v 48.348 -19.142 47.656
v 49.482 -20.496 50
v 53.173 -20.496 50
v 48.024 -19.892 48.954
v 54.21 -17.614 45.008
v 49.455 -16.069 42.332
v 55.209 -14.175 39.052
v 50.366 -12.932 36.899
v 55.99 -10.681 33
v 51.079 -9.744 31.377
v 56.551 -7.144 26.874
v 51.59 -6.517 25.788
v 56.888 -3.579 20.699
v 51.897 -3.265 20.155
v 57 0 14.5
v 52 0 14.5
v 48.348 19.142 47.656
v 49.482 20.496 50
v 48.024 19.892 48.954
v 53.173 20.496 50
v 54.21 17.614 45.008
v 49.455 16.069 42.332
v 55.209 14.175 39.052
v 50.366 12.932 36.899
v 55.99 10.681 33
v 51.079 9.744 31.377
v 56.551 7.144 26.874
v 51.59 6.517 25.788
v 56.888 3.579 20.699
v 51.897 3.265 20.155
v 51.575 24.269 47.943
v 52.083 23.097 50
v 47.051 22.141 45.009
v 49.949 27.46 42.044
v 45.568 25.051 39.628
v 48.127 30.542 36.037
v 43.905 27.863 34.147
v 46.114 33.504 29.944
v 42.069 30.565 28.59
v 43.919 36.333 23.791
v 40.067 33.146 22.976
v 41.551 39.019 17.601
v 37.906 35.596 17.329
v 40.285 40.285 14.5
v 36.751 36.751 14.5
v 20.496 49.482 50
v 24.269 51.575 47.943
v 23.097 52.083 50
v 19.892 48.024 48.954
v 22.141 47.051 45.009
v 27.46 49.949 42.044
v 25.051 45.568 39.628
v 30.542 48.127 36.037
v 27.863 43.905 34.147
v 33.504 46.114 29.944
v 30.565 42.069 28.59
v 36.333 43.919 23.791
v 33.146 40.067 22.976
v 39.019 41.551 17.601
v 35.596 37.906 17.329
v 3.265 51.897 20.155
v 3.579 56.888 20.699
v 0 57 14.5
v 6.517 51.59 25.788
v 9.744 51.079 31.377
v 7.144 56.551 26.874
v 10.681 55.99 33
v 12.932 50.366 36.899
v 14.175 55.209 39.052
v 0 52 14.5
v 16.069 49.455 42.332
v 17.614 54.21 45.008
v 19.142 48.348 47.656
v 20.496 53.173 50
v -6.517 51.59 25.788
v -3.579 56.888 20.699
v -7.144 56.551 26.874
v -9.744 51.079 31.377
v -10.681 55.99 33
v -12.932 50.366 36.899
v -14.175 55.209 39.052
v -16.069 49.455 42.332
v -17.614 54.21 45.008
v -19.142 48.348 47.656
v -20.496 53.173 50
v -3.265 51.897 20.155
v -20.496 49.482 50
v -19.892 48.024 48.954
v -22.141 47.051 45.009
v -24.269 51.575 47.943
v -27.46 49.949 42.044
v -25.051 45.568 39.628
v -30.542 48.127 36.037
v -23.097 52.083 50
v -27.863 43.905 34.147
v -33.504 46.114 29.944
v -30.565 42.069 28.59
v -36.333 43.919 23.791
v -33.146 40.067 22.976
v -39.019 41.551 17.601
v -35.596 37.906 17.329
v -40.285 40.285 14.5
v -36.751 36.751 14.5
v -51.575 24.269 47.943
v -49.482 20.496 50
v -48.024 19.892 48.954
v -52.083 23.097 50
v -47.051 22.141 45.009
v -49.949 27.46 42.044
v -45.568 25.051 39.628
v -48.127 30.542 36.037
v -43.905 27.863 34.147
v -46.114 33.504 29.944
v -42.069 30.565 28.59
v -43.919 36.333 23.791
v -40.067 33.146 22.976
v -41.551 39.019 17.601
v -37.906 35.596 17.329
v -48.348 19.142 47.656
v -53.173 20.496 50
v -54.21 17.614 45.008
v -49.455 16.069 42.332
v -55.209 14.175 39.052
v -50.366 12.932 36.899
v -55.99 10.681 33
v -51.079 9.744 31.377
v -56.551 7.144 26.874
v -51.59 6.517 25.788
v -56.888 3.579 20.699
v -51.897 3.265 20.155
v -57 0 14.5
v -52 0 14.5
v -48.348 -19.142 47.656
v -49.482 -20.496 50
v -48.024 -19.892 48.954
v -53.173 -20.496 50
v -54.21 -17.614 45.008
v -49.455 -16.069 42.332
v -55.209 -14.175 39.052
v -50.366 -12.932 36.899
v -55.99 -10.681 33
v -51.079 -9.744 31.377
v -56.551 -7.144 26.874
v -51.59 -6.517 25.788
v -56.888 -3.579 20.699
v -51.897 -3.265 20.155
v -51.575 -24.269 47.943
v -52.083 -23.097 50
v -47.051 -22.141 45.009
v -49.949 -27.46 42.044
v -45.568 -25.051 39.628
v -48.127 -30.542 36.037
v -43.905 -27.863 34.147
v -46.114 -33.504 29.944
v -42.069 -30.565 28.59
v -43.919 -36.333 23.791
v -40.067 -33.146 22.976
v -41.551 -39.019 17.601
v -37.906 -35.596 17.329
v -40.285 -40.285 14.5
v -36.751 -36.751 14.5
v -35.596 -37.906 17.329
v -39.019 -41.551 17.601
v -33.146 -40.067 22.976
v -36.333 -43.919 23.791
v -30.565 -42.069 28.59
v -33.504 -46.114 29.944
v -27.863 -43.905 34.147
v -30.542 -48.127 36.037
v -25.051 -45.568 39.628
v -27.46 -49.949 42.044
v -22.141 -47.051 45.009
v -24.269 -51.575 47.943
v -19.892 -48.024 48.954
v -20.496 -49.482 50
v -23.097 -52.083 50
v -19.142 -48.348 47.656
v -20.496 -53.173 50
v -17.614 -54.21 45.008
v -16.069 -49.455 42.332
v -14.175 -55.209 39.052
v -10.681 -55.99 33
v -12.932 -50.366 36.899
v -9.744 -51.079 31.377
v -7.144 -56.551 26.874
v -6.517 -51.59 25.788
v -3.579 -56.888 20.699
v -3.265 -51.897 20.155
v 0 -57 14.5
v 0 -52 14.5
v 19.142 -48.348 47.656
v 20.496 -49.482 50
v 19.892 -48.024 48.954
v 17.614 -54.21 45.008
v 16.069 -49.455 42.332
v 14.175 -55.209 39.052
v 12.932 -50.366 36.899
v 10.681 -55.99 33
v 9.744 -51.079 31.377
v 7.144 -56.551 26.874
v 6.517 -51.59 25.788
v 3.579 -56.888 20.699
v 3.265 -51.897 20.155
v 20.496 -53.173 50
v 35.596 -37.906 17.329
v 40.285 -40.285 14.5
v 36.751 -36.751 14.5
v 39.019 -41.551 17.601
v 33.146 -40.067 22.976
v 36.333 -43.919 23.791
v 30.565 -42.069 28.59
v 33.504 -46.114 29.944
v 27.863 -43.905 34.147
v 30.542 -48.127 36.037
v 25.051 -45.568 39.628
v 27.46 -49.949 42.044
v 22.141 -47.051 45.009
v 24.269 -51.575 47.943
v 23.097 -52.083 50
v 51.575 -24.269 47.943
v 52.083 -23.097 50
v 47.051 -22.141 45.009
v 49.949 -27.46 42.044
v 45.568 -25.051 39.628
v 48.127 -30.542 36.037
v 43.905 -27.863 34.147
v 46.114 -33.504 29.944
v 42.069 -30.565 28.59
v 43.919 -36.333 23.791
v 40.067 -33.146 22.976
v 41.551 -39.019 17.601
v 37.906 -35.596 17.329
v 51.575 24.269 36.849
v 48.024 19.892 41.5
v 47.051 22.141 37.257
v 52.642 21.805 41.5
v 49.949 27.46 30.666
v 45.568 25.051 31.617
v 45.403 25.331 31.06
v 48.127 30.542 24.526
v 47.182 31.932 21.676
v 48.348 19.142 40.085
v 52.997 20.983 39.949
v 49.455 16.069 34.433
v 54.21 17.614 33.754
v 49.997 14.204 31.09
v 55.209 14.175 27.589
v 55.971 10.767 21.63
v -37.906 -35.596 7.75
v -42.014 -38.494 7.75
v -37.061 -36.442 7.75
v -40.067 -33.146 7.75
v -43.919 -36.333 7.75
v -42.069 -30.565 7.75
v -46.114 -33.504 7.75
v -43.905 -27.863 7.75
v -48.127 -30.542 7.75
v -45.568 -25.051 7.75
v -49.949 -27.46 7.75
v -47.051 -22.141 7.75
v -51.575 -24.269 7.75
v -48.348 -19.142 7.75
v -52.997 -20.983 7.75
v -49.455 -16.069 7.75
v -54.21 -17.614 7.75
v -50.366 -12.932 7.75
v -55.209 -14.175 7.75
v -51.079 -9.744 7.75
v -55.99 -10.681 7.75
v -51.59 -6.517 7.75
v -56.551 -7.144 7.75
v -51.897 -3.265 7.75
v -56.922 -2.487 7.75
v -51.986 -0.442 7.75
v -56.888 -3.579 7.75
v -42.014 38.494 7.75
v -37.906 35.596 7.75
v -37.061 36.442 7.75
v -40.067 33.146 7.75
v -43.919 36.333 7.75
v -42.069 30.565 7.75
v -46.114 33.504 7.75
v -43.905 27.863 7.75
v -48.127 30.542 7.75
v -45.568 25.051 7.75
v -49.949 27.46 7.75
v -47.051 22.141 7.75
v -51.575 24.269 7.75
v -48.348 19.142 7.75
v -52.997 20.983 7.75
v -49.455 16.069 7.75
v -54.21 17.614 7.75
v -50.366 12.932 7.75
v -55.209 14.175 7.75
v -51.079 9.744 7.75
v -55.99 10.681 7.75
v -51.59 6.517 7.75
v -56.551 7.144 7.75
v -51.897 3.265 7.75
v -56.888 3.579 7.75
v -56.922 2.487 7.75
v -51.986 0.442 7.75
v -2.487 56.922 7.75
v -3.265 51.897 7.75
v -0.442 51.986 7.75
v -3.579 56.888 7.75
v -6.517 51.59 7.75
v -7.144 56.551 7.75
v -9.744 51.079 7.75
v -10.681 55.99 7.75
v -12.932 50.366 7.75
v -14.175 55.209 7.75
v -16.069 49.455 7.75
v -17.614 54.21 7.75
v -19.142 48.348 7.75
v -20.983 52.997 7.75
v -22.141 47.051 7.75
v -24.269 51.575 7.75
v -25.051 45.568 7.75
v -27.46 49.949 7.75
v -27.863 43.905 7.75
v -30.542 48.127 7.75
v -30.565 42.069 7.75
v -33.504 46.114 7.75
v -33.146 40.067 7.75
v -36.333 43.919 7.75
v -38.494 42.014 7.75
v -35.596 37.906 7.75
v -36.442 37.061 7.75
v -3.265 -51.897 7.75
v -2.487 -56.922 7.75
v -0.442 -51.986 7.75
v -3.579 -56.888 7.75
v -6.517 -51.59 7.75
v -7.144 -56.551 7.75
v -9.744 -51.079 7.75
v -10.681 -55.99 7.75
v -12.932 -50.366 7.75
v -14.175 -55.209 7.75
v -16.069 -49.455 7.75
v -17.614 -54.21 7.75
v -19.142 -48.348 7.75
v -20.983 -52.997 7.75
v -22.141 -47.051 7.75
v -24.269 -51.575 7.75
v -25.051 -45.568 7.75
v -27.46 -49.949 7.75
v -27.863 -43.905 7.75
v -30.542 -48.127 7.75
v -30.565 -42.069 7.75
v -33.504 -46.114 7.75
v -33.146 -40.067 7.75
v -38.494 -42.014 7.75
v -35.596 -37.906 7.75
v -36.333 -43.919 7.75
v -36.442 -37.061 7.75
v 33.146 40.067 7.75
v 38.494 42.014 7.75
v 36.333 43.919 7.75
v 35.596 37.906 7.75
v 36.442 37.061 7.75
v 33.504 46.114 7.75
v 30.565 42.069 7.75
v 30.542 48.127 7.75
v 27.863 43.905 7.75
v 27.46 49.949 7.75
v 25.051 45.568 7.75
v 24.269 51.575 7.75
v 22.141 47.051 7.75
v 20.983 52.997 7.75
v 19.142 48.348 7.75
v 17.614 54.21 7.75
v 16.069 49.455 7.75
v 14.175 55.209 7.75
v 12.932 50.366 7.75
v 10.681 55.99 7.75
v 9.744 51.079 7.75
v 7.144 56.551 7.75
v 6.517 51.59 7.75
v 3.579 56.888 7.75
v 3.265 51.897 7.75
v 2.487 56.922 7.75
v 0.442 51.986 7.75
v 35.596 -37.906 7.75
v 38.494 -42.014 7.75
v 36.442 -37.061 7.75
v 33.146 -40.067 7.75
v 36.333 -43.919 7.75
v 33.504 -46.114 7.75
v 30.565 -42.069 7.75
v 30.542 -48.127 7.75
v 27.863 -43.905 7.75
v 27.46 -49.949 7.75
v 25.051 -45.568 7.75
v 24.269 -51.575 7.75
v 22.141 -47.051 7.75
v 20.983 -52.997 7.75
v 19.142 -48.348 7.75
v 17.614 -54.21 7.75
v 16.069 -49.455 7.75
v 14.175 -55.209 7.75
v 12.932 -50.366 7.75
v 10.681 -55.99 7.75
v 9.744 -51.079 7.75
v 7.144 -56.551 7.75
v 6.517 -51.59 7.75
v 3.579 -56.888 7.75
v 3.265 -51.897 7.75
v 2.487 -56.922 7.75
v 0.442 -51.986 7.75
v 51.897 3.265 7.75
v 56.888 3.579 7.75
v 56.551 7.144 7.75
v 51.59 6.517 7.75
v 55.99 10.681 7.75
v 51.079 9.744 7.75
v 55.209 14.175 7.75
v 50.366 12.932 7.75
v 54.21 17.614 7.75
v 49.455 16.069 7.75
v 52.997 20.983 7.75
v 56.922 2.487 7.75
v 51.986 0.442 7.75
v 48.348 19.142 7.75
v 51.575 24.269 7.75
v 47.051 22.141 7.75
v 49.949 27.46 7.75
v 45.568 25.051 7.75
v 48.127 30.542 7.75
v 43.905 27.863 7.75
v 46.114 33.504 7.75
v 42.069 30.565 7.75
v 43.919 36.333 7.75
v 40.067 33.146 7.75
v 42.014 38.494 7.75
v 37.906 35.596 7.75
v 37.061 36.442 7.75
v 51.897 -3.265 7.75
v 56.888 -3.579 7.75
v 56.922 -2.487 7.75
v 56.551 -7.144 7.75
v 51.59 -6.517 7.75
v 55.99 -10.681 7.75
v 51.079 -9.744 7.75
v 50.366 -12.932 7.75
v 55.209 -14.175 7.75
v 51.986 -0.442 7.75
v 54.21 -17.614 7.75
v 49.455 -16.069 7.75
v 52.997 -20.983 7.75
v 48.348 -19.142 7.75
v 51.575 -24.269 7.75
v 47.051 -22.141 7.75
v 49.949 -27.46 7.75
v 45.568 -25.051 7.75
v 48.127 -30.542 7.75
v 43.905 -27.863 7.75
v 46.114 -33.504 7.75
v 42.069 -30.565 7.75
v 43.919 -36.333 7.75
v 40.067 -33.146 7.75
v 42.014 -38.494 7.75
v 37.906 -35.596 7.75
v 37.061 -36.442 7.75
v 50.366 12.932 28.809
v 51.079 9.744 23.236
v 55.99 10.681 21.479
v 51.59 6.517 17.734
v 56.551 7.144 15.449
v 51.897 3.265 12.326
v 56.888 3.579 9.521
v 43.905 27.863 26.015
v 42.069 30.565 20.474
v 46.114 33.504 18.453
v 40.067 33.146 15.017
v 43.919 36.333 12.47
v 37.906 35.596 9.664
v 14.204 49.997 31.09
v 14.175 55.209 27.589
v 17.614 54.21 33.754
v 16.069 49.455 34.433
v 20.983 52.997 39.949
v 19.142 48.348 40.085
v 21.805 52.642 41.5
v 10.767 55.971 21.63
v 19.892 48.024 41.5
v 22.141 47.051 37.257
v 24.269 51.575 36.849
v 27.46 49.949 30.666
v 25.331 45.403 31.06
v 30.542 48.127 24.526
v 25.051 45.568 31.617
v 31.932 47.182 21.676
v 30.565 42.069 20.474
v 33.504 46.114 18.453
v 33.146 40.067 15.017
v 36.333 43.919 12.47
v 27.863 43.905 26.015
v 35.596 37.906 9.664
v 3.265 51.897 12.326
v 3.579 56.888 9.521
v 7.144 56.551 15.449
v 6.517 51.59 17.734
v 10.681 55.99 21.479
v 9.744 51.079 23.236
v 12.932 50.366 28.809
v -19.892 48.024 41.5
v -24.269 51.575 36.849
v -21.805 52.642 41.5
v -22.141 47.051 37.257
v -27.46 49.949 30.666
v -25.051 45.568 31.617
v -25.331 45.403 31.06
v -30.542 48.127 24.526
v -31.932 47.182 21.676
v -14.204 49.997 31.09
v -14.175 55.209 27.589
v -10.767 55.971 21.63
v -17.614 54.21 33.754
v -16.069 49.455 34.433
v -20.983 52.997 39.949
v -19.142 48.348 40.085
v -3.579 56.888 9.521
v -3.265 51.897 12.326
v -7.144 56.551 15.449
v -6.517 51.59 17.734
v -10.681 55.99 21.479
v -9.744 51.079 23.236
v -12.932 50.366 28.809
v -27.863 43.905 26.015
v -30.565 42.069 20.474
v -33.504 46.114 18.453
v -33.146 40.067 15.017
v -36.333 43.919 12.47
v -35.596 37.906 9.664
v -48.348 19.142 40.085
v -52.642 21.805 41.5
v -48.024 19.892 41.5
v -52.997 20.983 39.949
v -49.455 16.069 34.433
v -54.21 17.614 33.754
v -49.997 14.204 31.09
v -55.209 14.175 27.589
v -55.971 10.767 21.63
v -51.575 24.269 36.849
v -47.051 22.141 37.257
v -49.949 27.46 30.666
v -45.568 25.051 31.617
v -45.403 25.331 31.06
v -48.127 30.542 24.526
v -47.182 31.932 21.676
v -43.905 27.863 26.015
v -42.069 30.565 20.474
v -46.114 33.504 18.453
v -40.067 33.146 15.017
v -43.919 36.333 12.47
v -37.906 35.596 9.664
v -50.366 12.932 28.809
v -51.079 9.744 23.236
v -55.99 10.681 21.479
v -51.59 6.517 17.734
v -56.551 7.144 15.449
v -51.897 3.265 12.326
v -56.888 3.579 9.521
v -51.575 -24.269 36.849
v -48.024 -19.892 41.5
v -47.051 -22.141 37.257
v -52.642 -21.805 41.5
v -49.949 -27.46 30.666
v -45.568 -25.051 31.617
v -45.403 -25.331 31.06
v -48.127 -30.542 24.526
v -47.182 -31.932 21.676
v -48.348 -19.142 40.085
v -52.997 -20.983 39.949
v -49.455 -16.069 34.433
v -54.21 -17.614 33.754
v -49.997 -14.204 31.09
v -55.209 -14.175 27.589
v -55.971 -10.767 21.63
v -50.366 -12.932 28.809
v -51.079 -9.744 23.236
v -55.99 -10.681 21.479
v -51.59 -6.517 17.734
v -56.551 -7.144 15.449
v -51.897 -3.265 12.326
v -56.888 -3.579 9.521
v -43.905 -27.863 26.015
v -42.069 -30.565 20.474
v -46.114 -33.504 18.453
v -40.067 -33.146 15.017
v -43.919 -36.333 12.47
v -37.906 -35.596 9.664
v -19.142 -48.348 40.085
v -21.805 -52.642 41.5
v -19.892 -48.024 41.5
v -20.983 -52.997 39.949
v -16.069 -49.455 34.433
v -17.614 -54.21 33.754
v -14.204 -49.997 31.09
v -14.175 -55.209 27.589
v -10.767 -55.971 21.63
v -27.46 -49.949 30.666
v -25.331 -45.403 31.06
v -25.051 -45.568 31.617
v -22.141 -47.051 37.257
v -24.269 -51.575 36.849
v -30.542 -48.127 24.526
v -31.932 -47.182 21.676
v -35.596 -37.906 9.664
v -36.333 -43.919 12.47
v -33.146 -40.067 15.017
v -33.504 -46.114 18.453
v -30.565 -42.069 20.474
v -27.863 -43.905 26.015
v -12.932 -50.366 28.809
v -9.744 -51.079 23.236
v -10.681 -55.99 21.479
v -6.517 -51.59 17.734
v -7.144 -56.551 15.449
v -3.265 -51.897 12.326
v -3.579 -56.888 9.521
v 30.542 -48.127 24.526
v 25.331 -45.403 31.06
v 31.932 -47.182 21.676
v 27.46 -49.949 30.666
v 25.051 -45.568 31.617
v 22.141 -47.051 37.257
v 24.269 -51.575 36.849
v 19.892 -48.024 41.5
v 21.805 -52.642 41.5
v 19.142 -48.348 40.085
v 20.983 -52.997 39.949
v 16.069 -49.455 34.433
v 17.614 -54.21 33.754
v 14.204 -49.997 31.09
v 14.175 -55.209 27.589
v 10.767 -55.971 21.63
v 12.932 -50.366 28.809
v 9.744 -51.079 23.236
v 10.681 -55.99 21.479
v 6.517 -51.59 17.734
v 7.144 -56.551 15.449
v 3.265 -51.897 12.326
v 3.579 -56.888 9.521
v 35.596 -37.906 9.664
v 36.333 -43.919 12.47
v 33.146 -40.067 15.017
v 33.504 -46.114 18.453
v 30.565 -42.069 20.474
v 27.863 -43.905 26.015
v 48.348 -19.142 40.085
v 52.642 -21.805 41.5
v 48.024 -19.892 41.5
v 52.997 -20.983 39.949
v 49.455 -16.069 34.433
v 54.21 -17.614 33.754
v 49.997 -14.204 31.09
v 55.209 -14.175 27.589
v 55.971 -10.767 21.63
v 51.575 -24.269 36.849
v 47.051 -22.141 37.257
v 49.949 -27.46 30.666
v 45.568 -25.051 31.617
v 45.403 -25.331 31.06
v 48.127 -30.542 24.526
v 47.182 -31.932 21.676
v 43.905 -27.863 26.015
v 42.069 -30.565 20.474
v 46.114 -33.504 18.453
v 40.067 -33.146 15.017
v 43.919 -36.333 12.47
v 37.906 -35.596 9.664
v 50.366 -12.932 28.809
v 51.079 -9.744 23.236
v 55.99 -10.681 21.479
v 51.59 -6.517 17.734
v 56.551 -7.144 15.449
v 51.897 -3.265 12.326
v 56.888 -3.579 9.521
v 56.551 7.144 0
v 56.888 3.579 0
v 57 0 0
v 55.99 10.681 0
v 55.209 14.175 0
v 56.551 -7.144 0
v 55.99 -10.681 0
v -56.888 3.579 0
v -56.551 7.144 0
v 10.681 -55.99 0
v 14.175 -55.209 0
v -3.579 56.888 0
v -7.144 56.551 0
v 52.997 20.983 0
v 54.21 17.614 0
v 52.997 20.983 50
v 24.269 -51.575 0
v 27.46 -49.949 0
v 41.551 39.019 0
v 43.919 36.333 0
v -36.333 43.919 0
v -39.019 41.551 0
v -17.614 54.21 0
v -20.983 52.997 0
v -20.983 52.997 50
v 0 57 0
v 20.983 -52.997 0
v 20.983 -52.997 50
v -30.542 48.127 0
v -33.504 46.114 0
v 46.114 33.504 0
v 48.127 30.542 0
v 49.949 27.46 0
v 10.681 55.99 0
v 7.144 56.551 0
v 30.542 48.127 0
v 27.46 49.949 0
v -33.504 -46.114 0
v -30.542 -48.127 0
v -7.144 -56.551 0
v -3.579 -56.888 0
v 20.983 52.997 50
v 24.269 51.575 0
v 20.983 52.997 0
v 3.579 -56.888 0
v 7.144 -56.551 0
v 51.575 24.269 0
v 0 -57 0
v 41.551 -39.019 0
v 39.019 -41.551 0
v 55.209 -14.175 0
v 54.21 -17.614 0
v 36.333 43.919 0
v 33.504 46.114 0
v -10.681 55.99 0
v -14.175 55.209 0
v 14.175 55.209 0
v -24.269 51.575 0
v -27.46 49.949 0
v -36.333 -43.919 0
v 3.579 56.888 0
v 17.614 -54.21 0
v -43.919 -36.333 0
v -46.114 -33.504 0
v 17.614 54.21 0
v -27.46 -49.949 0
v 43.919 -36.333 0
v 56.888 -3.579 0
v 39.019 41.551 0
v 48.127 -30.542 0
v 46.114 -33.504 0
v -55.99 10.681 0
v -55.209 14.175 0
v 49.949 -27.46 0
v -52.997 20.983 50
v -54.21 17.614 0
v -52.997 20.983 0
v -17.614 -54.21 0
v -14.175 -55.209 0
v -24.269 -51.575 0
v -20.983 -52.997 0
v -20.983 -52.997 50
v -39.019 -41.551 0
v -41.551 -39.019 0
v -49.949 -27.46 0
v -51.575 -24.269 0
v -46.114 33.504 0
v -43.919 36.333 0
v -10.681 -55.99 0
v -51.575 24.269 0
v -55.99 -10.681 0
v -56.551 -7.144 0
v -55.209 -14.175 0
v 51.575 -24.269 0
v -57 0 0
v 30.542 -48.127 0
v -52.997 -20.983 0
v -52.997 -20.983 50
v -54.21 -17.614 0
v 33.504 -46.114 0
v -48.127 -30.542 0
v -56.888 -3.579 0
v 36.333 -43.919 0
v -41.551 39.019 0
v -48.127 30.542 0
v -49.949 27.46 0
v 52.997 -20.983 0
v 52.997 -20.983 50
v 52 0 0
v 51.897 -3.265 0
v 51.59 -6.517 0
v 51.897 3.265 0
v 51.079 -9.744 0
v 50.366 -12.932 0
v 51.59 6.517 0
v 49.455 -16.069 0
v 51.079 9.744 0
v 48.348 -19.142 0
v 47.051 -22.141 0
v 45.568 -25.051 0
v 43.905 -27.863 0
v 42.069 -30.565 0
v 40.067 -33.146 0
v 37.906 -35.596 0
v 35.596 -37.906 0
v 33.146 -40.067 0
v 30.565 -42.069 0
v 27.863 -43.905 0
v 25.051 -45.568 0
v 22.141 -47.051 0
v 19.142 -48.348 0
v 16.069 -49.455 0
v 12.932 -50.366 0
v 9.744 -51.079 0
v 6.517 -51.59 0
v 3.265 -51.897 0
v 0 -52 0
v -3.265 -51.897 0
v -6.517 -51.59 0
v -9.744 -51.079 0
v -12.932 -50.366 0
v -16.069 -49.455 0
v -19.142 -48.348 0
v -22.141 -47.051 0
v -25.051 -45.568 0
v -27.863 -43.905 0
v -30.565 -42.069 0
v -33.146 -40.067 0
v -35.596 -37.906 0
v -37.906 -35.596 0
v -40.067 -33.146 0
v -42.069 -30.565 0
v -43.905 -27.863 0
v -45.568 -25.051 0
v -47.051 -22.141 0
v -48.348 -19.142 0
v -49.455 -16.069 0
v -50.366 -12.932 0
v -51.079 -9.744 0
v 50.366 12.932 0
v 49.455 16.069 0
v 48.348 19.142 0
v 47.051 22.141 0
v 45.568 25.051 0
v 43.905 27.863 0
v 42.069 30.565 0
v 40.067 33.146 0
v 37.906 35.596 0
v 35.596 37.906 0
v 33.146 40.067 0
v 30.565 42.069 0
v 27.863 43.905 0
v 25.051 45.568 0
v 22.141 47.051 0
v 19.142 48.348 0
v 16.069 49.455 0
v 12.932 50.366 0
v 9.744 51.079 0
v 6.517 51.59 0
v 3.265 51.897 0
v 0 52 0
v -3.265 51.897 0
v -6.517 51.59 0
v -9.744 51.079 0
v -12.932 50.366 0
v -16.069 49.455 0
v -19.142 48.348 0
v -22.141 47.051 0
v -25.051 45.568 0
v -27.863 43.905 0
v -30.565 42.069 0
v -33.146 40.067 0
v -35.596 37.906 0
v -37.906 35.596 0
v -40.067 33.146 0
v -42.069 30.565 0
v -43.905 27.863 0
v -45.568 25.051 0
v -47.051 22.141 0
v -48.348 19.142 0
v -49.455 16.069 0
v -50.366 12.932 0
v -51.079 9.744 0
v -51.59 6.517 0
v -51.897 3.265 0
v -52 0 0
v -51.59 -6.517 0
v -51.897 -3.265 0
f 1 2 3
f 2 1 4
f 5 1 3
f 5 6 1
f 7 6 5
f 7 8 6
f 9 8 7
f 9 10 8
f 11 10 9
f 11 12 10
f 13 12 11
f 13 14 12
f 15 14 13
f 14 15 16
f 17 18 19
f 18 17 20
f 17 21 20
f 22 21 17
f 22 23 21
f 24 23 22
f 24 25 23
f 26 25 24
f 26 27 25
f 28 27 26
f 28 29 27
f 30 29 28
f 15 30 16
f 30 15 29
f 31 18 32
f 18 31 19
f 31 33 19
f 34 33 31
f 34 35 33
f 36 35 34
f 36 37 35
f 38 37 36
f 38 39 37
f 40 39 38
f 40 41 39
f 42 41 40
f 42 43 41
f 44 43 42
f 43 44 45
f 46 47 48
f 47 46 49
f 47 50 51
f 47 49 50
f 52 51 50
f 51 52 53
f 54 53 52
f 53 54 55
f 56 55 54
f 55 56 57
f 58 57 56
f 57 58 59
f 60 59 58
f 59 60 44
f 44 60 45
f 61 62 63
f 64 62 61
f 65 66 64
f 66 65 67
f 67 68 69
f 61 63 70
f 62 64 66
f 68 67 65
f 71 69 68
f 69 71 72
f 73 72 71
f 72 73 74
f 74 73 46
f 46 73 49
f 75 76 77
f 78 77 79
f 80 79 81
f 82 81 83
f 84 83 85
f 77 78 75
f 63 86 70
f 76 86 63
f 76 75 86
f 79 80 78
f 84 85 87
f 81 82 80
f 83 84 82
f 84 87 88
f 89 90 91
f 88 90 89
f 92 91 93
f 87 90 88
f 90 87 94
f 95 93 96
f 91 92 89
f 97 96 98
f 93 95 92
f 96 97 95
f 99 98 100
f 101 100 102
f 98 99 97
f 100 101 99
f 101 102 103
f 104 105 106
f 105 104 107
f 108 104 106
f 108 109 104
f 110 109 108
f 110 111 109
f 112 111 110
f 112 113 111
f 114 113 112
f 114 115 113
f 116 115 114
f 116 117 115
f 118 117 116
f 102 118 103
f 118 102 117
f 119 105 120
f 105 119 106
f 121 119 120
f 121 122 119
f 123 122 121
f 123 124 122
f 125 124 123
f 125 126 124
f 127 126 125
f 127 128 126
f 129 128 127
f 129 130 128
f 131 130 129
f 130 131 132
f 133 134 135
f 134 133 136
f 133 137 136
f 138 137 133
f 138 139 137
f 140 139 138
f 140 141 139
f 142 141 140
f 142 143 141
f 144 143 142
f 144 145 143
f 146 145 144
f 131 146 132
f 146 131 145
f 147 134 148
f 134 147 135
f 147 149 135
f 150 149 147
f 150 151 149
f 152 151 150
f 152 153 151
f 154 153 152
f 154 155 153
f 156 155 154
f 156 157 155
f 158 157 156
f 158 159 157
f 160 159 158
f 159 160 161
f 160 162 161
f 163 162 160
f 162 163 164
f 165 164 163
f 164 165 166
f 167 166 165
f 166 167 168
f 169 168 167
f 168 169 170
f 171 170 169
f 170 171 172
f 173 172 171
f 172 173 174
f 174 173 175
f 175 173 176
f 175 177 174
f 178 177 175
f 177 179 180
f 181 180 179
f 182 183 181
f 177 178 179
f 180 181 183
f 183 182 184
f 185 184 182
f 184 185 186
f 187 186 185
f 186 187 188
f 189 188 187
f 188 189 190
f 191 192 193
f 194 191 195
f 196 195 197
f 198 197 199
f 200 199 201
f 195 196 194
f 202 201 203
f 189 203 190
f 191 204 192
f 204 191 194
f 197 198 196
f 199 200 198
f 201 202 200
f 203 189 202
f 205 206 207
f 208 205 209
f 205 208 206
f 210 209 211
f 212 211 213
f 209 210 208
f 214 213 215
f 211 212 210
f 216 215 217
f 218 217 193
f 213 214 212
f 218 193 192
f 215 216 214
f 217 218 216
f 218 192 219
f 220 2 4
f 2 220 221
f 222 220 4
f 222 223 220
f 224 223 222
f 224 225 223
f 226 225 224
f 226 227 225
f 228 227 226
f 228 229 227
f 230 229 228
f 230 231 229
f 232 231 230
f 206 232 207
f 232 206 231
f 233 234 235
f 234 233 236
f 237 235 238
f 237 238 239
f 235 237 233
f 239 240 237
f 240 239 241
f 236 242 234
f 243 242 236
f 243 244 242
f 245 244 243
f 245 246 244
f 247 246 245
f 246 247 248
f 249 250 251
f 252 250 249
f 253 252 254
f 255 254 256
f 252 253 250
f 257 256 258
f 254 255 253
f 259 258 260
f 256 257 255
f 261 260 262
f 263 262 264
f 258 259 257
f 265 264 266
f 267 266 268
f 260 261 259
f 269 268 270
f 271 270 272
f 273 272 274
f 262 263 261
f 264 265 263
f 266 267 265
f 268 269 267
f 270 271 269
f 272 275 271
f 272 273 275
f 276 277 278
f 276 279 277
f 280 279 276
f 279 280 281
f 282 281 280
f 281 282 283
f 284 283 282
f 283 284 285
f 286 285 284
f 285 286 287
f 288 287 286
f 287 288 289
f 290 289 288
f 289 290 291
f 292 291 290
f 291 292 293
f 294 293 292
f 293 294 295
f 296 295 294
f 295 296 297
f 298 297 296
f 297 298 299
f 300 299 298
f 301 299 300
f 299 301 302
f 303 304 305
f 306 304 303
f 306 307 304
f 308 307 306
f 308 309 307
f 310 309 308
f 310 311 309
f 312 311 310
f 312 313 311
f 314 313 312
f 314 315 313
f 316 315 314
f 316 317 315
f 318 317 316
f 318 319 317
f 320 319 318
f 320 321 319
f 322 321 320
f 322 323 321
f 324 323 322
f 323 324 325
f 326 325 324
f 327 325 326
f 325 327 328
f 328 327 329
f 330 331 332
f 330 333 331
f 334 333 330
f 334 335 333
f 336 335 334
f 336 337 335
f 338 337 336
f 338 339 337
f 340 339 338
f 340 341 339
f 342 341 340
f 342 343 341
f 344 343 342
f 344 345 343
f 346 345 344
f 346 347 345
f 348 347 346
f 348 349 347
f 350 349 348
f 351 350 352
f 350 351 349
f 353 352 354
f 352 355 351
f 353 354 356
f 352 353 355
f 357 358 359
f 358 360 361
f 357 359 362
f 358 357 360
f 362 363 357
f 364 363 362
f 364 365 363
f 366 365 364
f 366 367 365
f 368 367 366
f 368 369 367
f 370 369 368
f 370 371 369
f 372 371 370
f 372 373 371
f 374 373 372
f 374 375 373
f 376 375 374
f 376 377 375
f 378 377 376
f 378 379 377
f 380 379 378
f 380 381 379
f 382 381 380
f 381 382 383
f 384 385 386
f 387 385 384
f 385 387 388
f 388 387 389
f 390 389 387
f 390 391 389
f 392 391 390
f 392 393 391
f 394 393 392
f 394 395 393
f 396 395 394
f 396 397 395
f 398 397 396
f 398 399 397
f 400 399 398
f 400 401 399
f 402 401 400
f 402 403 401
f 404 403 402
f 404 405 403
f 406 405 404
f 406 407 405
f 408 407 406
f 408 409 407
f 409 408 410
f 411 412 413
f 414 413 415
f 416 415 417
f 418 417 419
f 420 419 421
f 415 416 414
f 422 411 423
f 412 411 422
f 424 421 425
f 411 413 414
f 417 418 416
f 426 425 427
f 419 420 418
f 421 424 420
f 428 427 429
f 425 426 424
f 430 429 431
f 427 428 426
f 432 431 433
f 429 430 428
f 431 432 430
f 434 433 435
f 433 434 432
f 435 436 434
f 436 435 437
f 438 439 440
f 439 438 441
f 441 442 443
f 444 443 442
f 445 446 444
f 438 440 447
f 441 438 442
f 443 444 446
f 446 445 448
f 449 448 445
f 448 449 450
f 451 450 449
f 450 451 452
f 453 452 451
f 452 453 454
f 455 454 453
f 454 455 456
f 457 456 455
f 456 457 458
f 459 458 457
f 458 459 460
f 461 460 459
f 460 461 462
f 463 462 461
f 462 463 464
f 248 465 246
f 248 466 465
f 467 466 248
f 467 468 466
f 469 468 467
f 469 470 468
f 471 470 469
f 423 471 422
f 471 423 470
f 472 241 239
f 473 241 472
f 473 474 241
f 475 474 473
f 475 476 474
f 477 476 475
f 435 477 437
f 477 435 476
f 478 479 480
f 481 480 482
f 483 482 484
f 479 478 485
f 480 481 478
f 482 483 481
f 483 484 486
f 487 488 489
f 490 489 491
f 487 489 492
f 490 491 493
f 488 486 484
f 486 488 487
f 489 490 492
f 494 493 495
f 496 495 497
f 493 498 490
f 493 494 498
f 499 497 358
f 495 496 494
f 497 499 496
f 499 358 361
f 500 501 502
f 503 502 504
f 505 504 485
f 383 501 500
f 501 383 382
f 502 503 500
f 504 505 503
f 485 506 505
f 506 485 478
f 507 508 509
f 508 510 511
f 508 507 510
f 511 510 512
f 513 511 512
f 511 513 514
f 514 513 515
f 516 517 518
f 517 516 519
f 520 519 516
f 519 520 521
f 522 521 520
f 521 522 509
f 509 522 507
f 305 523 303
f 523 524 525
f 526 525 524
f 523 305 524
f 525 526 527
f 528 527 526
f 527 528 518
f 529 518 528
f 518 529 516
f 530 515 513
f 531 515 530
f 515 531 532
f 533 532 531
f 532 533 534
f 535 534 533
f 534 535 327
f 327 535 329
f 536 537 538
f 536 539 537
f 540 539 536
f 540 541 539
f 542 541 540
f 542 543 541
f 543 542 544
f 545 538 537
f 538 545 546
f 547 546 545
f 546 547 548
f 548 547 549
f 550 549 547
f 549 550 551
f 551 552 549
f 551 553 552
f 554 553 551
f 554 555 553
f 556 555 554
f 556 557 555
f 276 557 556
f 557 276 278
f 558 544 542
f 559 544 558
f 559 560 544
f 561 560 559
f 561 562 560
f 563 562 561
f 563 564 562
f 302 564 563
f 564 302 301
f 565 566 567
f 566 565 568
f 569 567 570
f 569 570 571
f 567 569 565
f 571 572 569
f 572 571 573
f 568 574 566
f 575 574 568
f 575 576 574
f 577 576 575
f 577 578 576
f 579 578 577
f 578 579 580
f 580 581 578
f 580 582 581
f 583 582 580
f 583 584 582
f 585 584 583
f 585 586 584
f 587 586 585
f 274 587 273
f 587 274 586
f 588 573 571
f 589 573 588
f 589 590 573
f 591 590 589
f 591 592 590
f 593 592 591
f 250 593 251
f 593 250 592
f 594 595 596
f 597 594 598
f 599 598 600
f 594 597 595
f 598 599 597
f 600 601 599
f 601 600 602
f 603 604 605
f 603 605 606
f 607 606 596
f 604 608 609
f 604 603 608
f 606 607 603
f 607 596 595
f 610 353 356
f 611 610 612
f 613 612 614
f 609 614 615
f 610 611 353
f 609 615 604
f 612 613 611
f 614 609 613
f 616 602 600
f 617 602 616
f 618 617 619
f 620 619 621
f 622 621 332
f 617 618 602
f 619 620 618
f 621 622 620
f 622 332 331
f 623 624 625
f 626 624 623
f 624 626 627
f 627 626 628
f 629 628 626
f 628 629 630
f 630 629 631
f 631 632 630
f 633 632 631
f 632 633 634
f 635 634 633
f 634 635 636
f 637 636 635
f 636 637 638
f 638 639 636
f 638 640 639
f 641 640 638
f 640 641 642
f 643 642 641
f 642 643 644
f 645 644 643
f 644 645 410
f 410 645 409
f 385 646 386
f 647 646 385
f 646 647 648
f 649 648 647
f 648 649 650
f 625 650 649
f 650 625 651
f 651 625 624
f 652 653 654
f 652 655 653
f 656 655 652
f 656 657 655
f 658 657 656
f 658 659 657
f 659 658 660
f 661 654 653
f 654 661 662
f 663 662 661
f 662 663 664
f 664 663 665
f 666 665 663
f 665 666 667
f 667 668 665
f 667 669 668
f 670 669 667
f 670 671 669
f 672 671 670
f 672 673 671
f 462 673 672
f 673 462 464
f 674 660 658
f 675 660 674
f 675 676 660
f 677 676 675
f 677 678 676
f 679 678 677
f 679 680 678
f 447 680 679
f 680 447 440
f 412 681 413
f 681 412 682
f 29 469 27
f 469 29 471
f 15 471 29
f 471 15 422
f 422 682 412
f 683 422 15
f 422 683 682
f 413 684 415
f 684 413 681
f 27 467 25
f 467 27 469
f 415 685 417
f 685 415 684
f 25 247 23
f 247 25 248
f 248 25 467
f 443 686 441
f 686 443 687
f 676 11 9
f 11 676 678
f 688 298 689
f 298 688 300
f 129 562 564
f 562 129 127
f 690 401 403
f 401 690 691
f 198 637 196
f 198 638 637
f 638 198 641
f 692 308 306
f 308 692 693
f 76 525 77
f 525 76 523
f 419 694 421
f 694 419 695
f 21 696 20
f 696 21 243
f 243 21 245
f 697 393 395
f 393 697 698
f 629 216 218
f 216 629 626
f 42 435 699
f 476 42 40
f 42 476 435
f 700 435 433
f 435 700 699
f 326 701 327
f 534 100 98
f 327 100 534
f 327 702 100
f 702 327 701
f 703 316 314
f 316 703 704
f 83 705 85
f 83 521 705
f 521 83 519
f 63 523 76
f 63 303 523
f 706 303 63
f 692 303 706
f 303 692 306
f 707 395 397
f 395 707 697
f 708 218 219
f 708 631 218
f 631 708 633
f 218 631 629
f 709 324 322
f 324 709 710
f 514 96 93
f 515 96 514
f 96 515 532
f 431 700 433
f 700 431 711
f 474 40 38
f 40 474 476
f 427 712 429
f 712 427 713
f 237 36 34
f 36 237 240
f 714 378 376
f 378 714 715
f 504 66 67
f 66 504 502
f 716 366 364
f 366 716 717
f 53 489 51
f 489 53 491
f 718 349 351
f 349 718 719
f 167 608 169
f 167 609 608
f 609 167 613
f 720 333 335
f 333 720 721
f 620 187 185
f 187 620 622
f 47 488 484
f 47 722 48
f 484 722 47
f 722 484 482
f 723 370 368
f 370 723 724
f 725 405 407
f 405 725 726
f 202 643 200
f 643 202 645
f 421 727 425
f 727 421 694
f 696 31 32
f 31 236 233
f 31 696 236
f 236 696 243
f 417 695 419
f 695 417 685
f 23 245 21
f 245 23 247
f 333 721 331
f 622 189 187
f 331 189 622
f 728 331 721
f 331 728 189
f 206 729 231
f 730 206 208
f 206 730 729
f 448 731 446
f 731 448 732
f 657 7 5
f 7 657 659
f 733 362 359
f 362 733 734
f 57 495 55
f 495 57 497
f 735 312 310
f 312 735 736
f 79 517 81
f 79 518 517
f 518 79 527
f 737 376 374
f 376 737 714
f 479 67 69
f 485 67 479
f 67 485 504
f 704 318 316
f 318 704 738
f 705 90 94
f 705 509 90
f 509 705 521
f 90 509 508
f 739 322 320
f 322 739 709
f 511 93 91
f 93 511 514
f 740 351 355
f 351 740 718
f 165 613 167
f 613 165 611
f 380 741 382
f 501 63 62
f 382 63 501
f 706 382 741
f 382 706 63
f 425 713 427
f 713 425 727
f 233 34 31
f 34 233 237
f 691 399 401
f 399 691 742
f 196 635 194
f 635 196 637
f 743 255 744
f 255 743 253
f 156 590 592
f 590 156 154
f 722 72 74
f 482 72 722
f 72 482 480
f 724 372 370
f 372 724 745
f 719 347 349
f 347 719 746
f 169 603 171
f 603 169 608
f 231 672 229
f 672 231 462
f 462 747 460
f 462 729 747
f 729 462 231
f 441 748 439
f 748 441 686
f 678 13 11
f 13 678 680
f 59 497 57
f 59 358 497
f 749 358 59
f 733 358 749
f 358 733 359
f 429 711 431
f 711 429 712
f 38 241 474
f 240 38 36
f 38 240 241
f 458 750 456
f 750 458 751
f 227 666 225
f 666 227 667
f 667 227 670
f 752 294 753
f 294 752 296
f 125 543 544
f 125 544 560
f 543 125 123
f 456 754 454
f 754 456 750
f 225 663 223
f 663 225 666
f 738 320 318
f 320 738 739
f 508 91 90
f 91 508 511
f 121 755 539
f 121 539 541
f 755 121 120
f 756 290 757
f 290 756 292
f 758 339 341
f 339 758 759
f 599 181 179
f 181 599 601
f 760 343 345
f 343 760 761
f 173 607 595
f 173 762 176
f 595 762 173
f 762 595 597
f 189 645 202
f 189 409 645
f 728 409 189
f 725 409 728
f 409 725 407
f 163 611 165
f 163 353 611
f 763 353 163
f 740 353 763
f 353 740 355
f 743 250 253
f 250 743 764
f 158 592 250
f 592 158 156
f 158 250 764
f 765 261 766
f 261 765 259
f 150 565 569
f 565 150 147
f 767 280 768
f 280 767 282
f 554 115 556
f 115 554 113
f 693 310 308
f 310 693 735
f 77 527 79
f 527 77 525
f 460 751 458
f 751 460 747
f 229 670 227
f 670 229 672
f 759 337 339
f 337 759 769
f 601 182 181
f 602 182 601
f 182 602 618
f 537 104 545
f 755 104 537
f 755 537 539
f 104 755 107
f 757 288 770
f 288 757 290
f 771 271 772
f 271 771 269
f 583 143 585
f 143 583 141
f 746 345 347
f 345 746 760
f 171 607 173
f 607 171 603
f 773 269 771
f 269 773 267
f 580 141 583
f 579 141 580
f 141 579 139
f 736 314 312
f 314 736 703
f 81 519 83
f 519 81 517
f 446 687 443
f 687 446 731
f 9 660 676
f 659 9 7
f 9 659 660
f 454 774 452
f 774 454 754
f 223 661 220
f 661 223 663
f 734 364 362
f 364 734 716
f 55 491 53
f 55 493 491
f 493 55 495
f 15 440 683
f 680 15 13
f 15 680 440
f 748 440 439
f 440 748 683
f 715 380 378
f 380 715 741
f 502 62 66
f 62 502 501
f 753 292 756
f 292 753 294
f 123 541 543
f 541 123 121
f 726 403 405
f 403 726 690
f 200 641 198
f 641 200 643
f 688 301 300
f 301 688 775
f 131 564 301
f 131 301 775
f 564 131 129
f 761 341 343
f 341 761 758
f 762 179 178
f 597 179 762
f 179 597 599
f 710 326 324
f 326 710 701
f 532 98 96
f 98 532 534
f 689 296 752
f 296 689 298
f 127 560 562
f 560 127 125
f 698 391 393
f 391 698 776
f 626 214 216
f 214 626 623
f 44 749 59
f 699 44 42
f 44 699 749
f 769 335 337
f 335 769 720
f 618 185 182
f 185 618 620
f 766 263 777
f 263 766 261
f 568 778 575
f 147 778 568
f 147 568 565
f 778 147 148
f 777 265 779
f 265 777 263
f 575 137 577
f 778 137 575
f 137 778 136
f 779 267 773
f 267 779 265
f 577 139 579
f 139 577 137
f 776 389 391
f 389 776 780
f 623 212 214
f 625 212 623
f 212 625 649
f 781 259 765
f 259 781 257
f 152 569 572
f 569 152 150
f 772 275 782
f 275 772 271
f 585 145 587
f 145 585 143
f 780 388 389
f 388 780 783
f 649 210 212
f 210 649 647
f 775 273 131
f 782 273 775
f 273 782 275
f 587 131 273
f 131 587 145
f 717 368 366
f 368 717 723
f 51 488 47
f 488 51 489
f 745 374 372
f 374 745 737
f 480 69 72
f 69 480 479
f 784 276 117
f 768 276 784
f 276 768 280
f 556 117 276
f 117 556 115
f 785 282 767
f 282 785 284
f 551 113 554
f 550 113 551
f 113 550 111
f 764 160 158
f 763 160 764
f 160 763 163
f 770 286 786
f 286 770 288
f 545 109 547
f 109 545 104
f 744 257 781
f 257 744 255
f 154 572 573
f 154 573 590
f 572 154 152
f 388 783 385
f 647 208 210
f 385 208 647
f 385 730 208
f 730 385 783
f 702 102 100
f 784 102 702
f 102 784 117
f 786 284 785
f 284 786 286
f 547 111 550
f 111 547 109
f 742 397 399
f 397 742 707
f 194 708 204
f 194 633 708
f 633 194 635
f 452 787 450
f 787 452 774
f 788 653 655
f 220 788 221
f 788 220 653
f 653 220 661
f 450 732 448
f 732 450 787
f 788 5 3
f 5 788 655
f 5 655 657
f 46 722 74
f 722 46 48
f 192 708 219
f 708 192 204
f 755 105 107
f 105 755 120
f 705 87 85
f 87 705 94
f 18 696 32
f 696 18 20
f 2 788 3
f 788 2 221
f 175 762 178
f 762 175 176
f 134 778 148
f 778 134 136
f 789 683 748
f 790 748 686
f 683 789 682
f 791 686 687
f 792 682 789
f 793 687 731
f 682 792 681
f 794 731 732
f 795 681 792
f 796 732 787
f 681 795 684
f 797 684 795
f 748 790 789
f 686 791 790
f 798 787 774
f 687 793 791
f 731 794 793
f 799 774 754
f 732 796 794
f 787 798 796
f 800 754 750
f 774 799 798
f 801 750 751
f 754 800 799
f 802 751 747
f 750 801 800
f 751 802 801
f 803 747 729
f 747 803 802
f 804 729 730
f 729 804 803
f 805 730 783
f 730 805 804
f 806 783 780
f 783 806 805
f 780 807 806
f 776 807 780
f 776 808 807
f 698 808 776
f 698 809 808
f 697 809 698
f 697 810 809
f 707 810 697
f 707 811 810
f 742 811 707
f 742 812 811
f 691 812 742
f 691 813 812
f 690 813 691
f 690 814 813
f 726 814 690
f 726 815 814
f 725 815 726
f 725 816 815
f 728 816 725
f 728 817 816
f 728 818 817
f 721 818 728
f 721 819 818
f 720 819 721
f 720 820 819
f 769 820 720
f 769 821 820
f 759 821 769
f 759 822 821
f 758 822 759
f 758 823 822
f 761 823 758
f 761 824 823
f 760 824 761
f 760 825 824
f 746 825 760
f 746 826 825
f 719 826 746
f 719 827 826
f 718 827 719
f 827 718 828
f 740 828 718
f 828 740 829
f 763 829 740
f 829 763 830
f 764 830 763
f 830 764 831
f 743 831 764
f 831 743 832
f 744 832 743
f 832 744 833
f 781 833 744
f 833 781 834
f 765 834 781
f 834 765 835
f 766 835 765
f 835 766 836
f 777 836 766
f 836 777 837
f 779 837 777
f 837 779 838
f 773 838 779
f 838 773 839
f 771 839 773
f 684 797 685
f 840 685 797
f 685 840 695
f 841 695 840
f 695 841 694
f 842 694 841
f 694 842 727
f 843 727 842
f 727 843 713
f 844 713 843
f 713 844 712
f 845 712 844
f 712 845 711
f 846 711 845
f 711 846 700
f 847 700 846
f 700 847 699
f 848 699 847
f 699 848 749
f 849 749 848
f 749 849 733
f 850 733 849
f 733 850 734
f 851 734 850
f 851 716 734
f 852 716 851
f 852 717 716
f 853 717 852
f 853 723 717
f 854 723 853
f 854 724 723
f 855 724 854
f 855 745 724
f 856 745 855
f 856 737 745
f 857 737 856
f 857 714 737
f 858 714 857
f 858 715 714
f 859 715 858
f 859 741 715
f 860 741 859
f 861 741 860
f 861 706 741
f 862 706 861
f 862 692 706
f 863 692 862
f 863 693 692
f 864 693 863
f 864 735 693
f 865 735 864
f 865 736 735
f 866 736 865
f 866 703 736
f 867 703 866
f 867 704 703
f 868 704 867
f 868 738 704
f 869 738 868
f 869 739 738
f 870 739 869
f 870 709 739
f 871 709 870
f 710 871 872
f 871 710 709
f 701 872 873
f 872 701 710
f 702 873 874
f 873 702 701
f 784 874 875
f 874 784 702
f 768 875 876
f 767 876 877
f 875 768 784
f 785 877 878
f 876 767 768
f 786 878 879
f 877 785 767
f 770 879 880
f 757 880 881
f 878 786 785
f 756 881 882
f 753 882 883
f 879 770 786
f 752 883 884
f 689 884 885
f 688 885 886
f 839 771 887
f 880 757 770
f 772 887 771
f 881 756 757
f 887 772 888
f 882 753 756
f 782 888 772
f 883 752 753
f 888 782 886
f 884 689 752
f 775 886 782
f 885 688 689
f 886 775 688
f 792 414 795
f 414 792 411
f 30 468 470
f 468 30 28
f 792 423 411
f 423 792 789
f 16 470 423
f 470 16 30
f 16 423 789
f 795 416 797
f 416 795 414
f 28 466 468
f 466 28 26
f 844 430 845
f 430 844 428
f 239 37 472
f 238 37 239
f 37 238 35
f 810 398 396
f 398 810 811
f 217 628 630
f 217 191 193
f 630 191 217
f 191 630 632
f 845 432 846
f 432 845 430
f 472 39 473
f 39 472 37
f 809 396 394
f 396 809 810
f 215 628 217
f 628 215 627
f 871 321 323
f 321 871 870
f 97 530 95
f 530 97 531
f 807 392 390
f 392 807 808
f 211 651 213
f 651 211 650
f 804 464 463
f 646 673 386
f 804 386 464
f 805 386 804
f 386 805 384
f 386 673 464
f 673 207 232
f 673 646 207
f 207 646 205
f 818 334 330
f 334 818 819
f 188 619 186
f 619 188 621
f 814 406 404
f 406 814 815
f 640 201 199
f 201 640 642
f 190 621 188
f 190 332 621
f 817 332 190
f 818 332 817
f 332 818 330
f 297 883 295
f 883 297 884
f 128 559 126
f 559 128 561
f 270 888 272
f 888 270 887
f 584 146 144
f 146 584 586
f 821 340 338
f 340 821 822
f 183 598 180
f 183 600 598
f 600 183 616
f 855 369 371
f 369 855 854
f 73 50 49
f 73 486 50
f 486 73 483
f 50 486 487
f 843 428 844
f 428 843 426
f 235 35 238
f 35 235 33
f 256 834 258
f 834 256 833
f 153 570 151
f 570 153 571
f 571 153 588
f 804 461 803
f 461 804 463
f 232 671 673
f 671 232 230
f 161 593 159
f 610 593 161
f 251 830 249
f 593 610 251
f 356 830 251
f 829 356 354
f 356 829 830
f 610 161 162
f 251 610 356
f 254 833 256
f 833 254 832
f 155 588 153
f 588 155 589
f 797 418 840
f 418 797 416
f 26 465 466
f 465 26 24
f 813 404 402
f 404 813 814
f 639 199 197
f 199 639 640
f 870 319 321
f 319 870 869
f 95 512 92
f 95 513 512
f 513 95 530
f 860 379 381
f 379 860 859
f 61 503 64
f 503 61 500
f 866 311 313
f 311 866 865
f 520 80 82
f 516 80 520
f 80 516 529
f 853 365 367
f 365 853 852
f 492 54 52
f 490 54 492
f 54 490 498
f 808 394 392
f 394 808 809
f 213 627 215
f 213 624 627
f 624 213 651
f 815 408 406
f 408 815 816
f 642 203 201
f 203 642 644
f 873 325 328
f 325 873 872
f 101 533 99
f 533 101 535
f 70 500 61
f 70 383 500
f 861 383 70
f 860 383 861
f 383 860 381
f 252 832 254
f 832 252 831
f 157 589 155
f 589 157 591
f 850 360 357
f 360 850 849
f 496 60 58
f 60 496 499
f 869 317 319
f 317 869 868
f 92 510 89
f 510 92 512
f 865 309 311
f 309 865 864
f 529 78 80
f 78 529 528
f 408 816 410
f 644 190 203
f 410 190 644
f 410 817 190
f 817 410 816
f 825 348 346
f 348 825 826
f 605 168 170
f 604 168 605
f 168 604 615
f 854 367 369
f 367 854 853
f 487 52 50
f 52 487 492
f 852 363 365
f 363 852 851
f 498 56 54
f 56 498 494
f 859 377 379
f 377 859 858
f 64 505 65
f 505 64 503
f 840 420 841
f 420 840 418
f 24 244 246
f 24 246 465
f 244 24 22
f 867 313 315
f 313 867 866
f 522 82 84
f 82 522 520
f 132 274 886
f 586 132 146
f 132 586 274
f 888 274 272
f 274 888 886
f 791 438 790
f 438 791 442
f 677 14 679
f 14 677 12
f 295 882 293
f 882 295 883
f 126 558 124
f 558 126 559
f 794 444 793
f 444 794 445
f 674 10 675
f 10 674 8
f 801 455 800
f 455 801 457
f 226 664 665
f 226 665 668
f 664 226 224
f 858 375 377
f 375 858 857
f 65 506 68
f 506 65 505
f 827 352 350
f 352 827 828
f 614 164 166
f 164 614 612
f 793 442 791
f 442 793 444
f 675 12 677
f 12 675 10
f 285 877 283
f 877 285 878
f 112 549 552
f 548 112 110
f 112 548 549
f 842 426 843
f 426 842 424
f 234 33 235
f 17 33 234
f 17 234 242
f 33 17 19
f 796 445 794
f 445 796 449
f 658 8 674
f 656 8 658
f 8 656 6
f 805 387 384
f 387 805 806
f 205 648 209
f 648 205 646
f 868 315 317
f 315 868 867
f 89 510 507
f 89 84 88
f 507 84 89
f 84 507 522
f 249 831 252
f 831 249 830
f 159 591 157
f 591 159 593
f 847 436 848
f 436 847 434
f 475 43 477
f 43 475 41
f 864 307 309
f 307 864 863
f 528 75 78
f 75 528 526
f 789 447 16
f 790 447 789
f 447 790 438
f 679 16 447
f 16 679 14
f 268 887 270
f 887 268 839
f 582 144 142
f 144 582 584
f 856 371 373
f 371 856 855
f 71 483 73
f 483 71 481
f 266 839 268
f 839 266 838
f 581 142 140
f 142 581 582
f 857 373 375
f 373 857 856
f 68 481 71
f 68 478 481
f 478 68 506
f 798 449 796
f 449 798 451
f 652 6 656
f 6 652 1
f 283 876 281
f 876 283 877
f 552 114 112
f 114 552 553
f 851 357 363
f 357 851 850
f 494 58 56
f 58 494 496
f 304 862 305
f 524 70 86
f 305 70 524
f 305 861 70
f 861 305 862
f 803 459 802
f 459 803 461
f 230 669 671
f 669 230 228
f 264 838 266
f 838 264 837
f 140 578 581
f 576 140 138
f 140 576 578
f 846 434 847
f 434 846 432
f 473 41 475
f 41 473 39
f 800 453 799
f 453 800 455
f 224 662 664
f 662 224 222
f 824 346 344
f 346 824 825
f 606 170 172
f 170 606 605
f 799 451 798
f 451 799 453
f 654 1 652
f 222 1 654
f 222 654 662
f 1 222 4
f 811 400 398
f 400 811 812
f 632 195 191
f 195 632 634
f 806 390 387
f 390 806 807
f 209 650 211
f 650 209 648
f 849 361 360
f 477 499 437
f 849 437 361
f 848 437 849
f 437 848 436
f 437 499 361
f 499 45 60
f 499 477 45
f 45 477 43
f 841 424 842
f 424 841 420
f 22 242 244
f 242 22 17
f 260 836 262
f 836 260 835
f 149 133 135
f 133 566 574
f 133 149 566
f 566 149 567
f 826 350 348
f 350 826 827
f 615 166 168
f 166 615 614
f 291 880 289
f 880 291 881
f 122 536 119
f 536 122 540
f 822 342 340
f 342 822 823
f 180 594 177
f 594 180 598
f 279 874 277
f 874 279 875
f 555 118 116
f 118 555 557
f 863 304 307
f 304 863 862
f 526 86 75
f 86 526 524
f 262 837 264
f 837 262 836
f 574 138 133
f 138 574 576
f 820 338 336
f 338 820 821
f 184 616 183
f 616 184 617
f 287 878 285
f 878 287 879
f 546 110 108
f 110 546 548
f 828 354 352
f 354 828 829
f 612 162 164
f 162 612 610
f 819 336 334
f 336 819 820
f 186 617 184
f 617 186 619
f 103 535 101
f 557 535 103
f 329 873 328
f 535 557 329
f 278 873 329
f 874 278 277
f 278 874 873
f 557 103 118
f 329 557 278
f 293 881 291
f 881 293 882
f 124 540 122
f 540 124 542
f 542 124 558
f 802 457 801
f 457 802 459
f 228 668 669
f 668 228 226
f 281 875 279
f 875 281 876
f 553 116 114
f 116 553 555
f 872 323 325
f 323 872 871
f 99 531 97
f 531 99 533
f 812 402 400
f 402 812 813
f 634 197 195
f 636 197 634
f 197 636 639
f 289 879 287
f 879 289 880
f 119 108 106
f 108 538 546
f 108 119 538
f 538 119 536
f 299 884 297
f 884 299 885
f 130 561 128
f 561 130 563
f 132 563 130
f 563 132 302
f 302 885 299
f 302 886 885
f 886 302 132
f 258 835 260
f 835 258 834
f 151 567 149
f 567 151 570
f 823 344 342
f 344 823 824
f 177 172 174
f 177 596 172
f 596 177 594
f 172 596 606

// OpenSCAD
// cylinder quality
cq = 100;

thickness = 5;
outer_radius = 57;
inner_radius = outer_radius - thickness;
height = 50;
degs = 45;

module punch() {
 translate([inner_radius - (thickness), 0,height-thickness*2])
  rotate([0,90,0])
   linear_extrude(height=thickness * 2)
    circle(r=(height-thickness)/2 + 3, $fn=3);
}
module punch_up() {
 translate([inner_radius + (thickness*2), 0,(height/2) - thickness - 1])
 rotate([0,-90,0])
   linear_extrude(height=thickness * 3)
    circle(r=(height  -thickness)/2, $fn=3);
}

 difference() {
   cylinder(r=outer_radius, h=height, $fn=cq);
   translate([0,0,-1]) cylinder(r=inner_radius, h=height + 2, $fn=cq);
   for (z = [0 : degs : 360]) {
    #rotate([0,0,z]) punch();
   }
   for (z = [(degs/2) : degs : 360]) {
    #rotate([0,0,z]) punch_up();
   }
 }

/*
// stackable rim:
translate([0,0,height]) {
 difference() {
   cylinder(r1=outer_radius, r2=outer_radius + 4, h=thickness * 2, $fn=cq);
   translate([0,0,-1]) cylinder(r1=inner_radius, r2=inner_radius - 4, h=thickness * 2 + 2, $fn=cq);
   #translate([0,0,thickness])
    difference() {
     cylinder(r=outer_radius, h=thickness, $fn=cq);
     translate([0,0,-1]) cylinder(r=inner_radius, h=thickness + 2, $fn=cq);
  }
 }
}
*/
